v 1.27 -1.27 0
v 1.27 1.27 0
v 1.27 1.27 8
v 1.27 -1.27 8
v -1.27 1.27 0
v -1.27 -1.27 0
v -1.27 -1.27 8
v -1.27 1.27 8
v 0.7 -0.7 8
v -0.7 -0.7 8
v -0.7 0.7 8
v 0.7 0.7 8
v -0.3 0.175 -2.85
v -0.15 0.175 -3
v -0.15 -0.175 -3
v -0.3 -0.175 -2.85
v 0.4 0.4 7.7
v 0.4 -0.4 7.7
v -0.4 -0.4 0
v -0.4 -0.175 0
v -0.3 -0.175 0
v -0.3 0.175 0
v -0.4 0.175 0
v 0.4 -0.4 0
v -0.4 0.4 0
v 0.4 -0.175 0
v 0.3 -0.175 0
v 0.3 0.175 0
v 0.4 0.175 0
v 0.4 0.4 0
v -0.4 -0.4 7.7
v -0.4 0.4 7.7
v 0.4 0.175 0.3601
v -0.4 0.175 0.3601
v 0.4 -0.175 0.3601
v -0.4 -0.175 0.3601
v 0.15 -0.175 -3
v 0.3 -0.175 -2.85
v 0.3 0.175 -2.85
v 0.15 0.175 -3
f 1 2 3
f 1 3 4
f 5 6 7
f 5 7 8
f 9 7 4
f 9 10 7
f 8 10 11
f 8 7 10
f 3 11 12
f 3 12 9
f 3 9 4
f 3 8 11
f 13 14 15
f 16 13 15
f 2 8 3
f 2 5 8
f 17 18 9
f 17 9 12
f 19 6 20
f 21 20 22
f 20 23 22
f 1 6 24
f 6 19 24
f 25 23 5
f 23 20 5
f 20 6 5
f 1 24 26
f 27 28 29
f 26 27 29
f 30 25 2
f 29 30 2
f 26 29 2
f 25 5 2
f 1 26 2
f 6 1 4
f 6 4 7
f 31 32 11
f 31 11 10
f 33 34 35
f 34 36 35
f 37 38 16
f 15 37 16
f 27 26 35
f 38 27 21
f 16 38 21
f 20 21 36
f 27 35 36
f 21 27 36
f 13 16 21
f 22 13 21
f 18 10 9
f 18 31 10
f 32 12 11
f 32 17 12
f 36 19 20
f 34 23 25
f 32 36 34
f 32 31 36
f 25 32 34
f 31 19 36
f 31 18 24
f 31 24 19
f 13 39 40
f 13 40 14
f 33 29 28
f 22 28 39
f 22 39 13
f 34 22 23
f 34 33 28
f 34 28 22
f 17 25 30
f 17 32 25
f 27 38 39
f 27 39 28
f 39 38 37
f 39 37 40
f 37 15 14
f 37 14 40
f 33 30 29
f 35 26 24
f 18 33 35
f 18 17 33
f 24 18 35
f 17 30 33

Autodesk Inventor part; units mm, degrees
ref_plane "YZ Plane" through (0, 0, 0) normal (1, 0, 0) x (0, 1, 0)
ref_plane "XZ Plane" through (0, 0, 0) normal (0, 1, 0) x (-1, 0, 0)
ref_plane "XY Plane" through (0, 0, 0) normal (0, 0, 1) x (1, 0, 0)
sketch "Boceto39" plane through (0, 0, 0) normal (0, 0, 1) x (1, 0, 0)
  line L0 (-1.27, 1.27) -> (1.27, 1.27)
  line L1 (1.27, 1.27) -> (1.27, -1.27)
  line L2 (1.27, -1.27) -> (-1.27, -1.27)
  line L3 (-1.27, -1.27) -> (-1.27, 1.27)
  point P0 (0, 0)
  point P1 (0, 1.27)
  point P2 (-1.27, 0)
  dimension "d373" = 2.54
extrude "Extrusión13" add sketch "Boceto39" along normal blind 8
sketch "Boceto40" plane through (0, 0, 8) normal (0, 0, 1) x (1, 0, 0)
  line L0 (-0.4, 0.4) -> (0.4, 0.4)
  line L1 (0.4, 0.4) -> (0.4, -0.4)
  line L2 (0.4, -0.4) -> (-0.4, -0.4)
  line L3 (-0.4, -0.4) -> (-0.4, 0.4)
  point P0 (0, 0)
  point P1 (0, 0.4)
  point P2 (-0.4, 0)
  dimension "d376" = 0.8
extrude "Extrusión14" cut sketch "Boceto40" against normal blind 8
chamfer "Chaflán5" distance 0.3 angle 45 4 edges at (0, 0.4, 8) (0.4, 0, 8) (0, -0.4, 8) (-0.4, 0, 8)
sketch "Boceto42" plane through (0, 0, 0) normal (0, 1, 0) x (-1, 0, 0)
  line L0 (-0.4, 7.7) -> (-0.4, 0) construction
  line L1 (0.4, 7.7) -> (0.4, 0) construction
  line L2 (-0.4, 0) -> (-0.3, 0)
  line L3 (-1.27, 0) -> (1.27, 0) construction
  line L4 (-0.3, -3) -> (-0.3, 0)
  line L5 (0.3, -3) -> (-0.3, -3)
  line L6 (0.3, -3) -> (0.3, 0)
  line L7 (0.3, 0) -> (0.4, 0)
  line L8 (0.4, 0) -> (0.4, 0.3601)
  line L9 (0.4, 0.3601) -> (-0.4, 0.3601)
  line L10 (-0.4, 0.3601) -> (-0.4, 0)
  point P0 (0, 0)
  point P1 (0, -3)
  point P2 (0, 0)
  dimension "d386" = 0.6
  dimension "d387" = 3
extrude "Extrusión16" add sketch "Boceto42" along normal mid plane 0.35
chamfer "Chaflán6" distance 0.15 angle 45 2 edges at (0.3, 0, -3) (-0.3, 0, -3)
properties part number "CON-HEM"
